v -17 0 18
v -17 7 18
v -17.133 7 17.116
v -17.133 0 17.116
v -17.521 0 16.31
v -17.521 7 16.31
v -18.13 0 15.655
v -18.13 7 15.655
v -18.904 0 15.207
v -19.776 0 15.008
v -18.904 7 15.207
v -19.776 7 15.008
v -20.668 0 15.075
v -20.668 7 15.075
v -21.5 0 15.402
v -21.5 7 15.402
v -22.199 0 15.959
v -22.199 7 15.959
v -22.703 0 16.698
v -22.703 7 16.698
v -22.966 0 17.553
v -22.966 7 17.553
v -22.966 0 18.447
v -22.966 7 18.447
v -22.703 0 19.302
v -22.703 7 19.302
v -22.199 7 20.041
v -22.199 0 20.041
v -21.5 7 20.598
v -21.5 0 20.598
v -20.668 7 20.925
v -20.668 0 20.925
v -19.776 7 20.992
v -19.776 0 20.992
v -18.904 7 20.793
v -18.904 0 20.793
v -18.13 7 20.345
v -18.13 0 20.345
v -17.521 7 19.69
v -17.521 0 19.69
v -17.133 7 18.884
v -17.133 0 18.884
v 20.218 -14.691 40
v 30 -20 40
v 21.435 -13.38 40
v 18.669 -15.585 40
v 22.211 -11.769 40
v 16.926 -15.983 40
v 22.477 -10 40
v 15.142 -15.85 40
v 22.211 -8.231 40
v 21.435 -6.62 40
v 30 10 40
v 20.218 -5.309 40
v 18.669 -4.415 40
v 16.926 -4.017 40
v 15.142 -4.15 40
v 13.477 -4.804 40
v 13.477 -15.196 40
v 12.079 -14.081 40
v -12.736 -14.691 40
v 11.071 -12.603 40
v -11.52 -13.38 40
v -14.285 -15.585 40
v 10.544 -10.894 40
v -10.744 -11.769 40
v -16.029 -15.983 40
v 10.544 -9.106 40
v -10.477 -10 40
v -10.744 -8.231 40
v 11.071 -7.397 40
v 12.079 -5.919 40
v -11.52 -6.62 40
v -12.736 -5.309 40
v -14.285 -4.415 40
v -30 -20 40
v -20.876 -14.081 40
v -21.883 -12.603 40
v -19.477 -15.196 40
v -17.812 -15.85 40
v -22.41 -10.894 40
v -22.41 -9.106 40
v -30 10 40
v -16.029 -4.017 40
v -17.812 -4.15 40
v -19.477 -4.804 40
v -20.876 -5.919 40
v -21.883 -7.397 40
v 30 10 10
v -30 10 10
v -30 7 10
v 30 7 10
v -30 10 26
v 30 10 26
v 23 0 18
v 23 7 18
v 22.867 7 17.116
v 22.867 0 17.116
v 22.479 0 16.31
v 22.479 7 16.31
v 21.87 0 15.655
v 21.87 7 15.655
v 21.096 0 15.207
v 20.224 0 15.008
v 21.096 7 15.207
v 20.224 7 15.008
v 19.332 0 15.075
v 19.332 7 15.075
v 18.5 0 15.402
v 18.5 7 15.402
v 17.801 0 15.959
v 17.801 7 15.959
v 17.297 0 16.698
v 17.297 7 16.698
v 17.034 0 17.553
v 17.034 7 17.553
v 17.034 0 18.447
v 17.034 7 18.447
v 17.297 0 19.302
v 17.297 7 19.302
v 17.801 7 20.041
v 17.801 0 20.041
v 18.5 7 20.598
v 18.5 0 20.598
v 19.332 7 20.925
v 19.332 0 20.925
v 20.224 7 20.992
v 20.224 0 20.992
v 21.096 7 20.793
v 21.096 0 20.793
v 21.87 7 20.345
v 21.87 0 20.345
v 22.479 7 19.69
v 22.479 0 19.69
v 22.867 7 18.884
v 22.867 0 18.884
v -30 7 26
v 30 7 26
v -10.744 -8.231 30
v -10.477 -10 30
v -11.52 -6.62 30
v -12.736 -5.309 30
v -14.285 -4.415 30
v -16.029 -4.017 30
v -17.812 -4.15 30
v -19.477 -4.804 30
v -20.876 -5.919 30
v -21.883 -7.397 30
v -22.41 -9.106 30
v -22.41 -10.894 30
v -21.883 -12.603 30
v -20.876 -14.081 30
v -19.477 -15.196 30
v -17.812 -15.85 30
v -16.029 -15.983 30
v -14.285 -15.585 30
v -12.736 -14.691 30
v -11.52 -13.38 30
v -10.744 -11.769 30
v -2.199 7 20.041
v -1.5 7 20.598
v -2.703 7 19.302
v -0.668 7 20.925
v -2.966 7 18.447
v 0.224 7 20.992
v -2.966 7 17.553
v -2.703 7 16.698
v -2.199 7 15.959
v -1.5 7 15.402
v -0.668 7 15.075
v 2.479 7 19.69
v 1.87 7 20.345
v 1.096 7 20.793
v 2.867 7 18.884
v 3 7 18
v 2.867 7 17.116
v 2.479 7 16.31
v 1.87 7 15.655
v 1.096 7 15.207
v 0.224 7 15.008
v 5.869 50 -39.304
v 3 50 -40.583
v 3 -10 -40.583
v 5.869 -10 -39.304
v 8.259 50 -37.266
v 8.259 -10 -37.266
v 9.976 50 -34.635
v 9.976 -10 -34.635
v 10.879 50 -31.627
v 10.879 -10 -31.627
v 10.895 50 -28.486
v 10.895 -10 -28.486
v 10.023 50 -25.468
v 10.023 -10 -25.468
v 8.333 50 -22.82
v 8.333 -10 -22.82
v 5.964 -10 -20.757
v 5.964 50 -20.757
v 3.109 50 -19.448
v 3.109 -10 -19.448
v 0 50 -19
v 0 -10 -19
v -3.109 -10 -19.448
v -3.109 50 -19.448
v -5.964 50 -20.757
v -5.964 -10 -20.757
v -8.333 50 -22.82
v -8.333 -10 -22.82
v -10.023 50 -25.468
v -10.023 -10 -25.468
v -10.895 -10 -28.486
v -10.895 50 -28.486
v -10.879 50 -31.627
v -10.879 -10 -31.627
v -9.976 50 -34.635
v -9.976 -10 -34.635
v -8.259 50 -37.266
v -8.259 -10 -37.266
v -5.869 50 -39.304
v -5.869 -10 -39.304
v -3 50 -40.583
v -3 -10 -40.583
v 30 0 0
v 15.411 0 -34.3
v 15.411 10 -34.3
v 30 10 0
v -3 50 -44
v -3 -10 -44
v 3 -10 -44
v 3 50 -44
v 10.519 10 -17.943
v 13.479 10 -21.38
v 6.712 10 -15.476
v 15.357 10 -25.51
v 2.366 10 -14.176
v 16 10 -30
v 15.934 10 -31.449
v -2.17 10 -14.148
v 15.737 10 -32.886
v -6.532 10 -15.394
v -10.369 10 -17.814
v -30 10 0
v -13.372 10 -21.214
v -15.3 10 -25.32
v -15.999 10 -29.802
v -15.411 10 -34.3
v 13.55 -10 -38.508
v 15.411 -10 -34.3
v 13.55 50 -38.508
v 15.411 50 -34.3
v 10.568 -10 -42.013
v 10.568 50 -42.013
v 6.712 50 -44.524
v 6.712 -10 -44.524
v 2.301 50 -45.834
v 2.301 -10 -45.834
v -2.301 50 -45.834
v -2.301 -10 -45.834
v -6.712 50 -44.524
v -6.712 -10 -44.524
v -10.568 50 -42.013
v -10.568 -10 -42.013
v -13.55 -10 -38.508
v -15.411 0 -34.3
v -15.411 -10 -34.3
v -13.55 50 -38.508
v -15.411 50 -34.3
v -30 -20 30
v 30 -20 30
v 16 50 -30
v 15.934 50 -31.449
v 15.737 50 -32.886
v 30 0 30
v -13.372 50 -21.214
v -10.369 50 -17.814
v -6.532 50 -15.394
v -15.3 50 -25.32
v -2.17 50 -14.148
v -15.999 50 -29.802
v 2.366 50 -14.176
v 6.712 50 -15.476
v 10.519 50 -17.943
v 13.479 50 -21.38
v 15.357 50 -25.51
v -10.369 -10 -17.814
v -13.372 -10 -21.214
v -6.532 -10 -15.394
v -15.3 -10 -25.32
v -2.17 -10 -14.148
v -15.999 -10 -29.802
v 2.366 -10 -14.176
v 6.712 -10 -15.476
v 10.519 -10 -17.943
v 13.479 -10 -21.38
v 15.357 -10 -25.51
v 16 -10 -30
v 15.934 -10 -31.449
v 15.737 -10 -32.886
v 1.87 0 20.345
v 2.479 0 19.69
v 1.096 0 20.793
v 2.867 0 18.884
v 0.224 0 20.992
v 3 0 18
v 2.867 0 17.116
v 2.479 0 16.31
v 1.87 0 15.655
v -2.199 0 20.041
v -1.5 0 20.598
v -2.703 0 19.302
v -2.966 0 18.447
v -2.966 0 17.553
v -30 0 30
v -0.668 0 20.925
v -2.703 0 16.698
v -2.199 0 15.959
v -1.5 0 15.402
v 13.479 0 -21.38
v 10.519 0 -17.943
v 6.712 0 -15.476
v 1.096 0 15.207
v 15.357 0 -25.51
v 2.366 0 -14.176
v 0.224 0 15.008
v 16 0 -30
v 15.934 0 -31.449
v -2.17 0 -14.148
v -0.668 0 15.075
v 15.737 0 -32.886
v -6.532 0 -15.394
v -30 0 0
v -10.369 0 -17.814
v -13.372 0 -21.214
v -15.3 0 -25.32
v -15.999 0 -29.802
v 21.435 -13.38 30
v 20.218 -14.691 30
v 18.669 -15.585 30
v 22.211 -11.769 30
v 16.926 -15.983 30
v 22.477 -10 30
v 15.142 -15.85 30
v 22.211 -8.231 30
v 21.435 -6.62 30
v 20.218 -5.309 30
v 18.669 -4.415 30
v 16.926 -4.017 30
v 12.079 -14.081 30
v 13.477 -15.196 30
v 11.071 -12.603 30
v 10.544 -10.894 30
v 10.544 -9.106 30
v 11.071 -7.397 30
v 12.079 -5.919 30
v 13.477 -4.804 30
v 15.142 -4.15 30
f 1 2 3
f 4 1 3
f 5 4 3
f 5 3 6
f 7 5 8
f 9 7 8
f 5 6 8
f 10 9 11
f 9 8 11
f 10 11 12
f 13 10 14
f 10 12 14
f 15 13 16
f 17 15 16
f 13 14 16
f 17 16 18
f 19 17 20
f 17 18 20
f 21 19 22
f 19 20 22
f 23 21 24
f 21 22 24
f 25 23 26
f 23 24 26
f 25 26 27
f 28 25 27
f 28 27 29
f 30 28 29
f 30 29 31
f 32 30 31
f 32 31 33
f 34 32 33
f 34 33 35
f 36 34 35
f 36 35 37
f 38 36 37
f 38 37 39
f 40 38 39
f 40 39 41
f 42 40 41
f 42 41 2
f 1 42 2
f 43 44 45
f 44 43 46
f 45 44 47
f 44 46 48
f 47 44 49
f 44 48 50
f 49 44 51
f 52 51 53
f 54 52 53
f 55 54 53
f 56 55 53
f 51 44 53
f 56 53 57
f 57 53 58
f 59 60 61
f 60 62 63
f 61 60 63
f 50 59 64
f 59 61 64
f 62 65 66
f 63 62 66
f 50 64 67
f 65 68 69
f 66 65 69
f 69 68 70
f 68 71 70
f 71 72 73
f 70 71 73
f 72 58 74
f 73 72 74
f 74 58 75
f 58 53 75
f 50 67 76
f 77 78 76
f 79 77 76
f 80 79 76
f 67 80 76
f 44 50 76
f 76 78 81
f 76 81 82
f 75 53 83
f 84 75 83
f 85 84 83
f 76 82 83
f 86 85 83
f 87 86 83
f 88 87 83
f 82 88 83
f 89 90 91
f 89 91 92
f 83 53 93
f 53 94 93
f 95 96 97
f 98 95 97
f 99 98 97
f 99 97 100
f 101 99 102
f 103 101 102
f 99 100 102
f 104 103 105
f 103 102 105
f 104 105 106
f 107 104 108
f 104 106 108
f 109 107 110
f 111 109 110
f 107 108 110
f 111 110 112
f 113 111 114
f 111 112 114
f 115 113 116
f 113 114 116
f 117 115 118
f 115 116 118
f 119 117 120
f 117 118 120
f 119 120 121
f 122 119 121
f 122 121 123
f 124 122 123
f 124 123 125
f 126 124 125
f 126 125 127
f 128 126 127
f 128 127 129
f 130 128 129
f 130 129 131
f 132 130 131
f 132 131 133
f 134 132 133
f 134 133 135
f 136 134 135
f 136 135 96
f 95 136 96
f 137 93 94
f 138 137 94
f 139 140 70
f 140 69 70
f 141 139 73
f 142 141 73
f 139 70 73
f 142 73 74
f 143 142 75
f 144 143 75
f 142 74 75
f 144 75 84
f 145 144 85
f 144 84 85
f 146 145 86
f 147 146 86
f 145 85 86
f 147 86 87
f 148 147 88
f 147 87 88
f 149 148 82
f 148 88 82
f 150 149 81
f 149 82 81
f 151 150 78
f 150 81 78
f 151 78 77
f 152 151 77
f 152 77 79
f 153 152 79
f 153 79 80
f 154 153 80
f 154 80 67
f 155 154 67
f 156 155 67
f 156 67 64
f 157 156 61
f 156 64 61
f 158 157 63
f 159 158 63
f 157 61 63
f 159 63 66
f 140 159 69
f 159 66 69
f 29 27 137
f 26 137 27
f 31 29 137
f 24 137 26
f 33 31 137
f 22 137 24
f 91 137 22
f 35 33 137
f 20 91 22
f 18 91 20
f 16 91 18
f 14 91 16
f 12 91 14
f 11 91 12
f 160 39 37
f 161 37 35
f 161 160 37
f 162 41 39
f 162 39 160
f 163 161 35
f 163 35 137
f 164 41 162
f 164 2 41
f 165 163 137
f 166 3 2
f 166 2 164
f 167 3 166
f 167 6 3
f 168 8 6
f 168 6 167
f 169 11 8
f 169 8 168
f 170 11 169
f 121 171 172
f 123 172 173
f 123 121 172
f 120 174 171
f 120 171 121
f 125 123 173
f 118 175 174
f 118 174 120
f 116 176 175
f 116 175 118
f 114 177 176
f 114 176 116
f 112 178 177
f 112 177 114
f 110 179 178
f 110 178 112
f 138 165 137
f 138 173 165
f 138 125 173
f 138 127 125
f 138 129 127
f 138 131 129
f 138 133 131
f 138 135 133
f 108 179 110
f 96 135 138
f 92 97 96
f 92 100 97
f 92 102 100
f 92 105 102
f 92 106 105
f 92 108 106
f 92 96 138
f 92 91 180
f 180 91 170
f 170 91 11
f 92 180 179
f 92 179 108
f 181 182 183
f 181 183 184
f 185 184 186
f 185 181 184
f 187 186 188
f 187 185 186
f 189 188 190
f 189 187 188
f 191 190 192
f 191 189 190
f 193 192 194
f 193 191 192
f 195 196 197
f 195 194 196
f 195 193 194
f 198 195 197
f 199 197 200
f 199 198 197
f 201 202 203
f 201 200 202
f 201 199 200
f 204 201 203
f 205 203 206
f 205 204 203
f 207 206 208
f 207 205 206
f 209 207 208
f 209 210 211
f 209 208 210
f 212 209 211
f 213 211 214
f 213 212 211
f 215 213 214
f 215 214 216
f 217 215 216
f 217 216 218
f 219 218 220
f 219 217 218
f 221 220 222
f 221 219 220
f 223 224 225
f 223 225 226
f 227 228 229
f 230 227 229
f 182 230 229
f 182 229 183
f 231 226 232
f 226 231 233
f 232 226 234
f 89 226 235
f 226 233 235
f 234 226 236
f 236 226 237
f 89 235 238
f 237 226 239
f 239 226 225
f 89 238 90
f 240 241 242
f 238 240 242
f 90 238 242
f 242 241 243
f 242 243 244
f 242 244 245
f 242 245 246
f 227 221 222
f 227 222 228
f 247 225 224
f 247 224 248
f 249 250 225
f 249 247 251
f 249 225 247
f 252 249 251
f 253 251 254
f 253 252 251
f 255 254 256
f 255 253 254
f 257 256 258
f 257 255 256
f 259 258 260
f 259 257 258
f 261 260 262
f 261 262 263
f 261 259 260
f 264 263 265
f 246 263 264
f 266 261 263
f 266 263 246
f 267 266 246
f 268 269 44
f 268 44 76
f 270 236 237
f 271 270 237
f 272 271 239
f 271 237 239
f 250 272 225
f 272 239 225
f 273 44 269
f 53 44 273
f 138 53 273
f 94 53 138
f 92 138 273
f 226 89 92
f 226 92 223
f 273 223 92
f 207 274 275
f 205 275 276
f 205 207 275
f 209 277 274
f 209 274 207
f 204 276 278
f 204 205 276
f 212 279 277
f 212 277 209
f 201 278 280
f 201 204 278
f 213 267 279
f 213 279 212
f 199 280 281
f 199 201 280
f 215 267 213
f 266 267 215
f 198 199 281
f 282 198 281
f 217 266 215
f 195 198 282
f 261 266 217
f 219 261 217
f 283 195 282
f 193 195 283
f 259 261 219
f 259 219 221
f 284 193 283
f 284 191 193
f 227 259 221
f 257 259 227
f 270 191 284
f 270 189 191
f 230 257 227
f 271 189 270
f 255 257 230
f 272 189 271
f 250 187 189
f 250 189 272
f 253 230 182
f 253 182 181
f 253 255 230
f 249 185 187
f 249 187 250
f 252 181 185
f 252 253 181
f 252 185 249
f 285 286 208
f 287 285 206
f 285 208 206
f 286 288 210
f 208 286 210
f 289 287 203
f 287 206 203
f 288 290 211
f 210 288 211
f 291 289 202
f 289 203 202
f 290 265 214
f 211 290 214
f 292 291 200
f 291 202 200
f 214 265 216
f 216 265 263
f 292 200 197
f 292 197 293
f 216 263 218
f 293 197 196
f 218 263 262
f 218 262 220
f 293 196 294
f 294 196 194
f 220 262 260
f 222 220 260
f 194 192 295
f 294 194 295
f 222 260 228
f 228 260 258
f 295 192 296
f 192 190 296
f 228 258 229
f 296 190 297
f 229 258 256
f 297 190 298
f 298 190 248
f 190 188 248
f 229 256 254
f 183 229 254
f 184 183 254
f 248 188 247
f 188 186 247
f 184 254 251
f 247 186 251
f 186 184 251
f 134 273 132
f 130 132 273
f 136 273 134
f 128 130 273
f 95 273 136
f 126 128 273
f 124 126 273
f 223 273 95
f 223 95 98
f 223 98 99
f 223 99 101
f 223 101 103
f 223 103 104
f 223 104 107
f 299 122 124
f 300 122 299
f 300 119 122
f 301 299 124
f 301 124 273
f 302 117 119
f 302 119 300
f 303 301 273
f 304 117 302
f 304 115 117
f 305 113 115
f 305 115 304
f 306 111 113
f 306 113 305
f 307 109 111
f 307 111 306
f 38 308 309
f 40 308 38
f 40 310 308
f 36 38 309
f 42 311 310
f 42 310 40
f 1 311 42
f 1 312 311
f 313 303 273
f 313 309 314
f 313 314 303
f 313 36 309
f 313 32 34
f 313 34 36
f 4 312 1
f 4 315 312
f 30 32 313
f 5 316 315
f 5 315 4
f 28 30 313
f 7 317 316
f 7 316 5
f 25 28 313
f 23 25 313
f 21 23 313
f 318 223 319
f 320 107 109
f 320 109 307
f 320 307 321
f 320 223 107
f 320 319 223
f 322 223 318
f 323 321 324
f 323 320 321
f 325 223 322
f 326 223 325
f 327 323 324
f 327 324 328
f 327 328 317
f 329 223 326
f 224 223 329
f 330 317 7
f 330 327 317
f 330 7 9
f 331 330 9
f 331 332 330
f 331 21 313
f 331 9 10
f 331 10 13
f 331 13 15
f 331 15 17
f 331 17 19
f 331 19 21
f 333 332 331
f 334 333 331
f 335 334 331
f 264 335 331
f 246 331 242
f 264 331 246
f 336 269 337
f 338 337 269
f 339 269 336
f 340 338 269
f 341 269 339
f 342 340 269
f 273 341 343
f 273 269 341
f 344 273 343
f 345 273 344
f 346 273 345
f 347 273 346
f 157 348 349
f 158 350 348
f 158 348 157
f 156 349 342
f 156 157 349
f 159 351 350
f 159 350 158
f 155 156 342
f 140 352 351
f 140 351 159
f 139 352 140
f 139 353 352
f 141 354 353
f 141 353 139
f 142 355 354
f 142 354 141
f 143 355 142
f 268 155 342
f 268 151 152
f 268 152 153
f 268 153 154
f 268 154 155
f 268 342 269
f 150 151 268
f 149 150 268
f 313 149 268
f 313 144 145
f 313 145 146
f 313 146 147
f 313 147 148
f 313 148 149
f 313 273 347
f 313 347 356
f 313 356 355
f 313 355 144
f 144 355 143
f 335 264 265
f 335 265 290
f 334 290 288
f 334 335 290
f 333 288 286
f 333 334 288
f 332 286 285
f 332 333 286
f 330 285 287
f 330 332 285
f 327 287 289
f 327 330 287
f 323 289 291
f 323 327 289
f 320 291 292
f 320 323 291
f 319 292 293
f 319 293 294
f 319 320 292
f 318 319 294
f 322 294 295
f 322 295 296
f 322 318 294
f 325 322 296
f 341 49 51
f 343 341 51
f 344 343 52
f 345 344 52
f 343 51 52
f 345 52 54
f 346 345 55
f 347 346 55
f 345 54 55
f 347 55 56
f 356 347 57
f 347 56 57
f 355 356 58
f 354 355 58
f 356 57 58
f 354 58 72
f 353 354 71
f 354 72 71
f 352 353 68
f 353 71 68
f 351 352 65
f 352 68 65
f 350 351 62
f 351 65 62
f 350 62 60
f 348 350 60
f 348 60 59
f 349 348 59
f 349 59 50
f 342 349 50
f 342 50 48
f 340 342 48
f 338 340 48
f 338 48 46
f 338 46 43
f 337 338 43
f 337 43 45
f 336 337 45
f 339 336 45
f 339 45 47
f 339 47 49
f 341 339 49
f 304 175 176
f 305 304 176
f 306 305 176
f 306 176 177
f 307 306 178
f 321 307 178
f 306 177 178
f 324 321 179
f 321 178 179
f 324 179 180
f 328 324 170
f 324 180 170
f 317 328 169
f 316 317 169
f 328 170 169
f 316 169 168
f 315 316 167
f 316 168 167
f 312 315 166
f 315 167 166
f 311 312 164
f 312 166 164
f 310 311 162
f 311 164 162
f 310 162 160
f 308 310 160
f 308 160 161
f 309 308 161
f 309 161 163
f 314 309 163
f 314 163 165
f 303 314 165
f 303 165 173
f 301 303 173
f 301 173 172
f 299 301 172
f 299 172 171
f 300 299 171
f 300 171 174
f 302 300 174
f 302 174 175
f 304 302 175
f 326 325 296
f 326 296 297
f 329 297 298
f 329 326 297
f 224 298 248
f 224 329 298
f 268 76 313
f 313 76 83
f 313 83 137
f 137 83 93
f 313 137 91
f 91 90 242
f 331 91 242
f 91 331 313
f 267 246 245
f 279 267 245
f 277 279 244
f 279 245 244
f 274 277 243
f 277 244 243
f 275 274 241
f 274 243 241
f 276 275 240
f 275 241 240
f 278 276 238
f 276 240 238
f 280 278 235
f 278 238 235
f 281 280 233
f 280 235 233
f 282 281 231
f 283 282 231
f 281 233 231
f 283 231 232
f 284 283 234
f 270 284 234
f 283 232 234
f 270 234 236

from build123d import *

# Parameters (mm, degrees)
BOSS_EXTRUDE1_DEPTH      = 10
BOSS_EXTRUDE2_DEPTH      = 40
BOSS_EXTRUDE2_DEPTH_BACK = 20
CUT_EXTRUDE1_DEPTH       = 61
SKETCH5_W                = 60
SKETCH5_H                = 10
BOSS_EXTRUDE3_DEPTH      = 20
CUT_EXTRUDE2_REACH       = 88
SKETCH6_R                = 6
SKETCH9_W                = 60
SKETCH9_H                = 16
SKETCH9_R                = 3
CUT_EXTRUDE4_DEPTH       = 3
SKETCH10_R               = 3
CUT_EXTRUDE5_DEPTH       = 38


with BuildPart() as part:
    # Sketch1 → Boss-Extrude1 (new body)
    with BuildSketch(Plane(origin=(0, 0, 0), x_dir=(1, 0, 0), z_dir=(0, 1, 0))):
        with BuildLine():
            Line((-30, 0), (-15.411351, 34.300029))
            ThreePointArc((-15.411351, 34.300029), (0, 46), (15.411351, 34.300029))
            Line((15.411351, 34.300029), (30, 0))
            Line((30, 0), (30, -40))
            Line((30, -40), (-30, -40))
            Line((-30, -40), (-30, 0))
        make_face()
    extrude(amount=BOSS_EXTRUDE1_DEPTH)

    # Sketch2 → Boss-Extrude2 (add, two sides)
    with BuildSketch(Plane(origin=(0, 10, 0), x_dir=(1, 0, 0), z_dir=(0, 1, 0))) as boss_extrude2_sk:
        with BuildLine():
            ThreePointArc((15.411351, 34.300029), (0, 46), (-15.411351, 34.300029))
            ThreePointArc((-15.411351, 34.300029), (-2.170066, 14.147845), (16, 30))
            ThreePointArc((16, 30), (15.852155, 32.170066), (15.411351, 34.300029))
        make_face()
    extrude(amount=BOSS_EXTRUDE2_DEPTH)
    extrude(boss_extrude2_sk.sketch, amount=-BOSS_EXTRUDE2_DEPTH_BACK)

    # Sketch3 → Cut-Extrude1 (cut, through all)
    with BuildSketch(Plane(origin=(0, 50, 0), x_dir=(1, 0, 0), z_dir=(0, 1, 0))):
        with BuildLine():
            Line((-3, 44), (3, 44))
            Line((3, 44), (3, 40.583005))
            ThreePointArc((3, 40.583005), (0, 19), (-3, 40.583005))
            Line((-3, 40.583005), (-3, 44))
        make_face()
    extrude(amount=-CUT_EXTRUDE1_DEPTH, mode=Mode.SUBTRACT)

    # Sketch5 → Boss-Extrude3 (add)
    with BuildSketch(Plane(origin=(0, 0, 0), x_dir=(-1, 0, 0), z_dir=(0, -1, 0))):
        with Locations((0, -35)):
            Rectangle(SKETCH5_W, SKETCH5_H)
    extrude(amount=BOSS_EXTRUDE3_DEPTH)

    # Sketch6 → Cut-Extrude2 (cut, up to next)
    with BuildSketch(Plane.XY.offset(40), mode=Mode.PRIVATE) as cut_extrude2_sk1:
        with Locations((16.477302, -10)):
            Circle(SKETCH6_R)
    cut_extrude2_tool1 = extrude(cut_extrude2_sk1.sketch, amount=-CUT_EXTRUDE2_REACH, mode=Mode.PRIVATE) & part.part
    add(cut_extrude2_tool1.solids().sort_by_distance((16.477302, -10, 40))[0], mode=Mode.SUBTRACT)
    # Sketch6 → Cut-Extrude2 (cut, up to next)
    with BuildSketch(Plane.XY.offset(40), mode=Mode.PRIVATE) as cut_extrude2_sk2:
        with Locations((-16.477302, -10)):
            Circle(SKETCH6_R)
    cut_extrude2_tool2 = extrude(cut_extrude2_sk2.sketch, amount=-CUT_EXTRUDE2_REACH, mode=Mode.PRIVATE) & part.part
    add(cut_extrude2_tool2.solids().sort_by_distance((-16.477302, -10, 40))[0], mode=Mode.SUBTRACT)

    # Sketch9 → Cut-Extrude4 (cut)
    with BuildSketch(Plane(origin=(0, 10, 0), x_dir=(1, 0, 0), z_dir=(0, 1, 0))):
        with Locations((0, -18)):
            Rectangle(SKETCH9_W, SKETCH9_H)
        with Locations((0, -18)):
            Circle(SKETCH9_R, mode=Mode.SUBTRACT)
        with Locations((20, -18)):
            Circle(SKETCH9_R, mode=Mode.SUBTRACT)
        with Locations((-20, -18)):
            Circle(SKETCH9_R, mode=Mode.SUBTRACT)
    extrude(amount=-CUT_EXTRUDE4_DEPTH, mode=Mode.SUBTRACT)

    # Sketch10 → Cut-Extrude5 (cut, through all)
    with BuildSketch(Plane(origin=(0, 17, 0), x_dir=(1, 0, 0), z_dir=(0, 1, 0))):
        with Locations((20, -18)):
            Circle(SKETCH10_R)
        with Locations((0, -18)):
            Circle(SKETCH10_R)
        with Locations((-20, -18)):
            Circle(SKETCH10_R)
    extrude(amount=-CUT_EXTRUDE5_DEPTH, mode=Mode.SUBTRACT)


solid = part.part
